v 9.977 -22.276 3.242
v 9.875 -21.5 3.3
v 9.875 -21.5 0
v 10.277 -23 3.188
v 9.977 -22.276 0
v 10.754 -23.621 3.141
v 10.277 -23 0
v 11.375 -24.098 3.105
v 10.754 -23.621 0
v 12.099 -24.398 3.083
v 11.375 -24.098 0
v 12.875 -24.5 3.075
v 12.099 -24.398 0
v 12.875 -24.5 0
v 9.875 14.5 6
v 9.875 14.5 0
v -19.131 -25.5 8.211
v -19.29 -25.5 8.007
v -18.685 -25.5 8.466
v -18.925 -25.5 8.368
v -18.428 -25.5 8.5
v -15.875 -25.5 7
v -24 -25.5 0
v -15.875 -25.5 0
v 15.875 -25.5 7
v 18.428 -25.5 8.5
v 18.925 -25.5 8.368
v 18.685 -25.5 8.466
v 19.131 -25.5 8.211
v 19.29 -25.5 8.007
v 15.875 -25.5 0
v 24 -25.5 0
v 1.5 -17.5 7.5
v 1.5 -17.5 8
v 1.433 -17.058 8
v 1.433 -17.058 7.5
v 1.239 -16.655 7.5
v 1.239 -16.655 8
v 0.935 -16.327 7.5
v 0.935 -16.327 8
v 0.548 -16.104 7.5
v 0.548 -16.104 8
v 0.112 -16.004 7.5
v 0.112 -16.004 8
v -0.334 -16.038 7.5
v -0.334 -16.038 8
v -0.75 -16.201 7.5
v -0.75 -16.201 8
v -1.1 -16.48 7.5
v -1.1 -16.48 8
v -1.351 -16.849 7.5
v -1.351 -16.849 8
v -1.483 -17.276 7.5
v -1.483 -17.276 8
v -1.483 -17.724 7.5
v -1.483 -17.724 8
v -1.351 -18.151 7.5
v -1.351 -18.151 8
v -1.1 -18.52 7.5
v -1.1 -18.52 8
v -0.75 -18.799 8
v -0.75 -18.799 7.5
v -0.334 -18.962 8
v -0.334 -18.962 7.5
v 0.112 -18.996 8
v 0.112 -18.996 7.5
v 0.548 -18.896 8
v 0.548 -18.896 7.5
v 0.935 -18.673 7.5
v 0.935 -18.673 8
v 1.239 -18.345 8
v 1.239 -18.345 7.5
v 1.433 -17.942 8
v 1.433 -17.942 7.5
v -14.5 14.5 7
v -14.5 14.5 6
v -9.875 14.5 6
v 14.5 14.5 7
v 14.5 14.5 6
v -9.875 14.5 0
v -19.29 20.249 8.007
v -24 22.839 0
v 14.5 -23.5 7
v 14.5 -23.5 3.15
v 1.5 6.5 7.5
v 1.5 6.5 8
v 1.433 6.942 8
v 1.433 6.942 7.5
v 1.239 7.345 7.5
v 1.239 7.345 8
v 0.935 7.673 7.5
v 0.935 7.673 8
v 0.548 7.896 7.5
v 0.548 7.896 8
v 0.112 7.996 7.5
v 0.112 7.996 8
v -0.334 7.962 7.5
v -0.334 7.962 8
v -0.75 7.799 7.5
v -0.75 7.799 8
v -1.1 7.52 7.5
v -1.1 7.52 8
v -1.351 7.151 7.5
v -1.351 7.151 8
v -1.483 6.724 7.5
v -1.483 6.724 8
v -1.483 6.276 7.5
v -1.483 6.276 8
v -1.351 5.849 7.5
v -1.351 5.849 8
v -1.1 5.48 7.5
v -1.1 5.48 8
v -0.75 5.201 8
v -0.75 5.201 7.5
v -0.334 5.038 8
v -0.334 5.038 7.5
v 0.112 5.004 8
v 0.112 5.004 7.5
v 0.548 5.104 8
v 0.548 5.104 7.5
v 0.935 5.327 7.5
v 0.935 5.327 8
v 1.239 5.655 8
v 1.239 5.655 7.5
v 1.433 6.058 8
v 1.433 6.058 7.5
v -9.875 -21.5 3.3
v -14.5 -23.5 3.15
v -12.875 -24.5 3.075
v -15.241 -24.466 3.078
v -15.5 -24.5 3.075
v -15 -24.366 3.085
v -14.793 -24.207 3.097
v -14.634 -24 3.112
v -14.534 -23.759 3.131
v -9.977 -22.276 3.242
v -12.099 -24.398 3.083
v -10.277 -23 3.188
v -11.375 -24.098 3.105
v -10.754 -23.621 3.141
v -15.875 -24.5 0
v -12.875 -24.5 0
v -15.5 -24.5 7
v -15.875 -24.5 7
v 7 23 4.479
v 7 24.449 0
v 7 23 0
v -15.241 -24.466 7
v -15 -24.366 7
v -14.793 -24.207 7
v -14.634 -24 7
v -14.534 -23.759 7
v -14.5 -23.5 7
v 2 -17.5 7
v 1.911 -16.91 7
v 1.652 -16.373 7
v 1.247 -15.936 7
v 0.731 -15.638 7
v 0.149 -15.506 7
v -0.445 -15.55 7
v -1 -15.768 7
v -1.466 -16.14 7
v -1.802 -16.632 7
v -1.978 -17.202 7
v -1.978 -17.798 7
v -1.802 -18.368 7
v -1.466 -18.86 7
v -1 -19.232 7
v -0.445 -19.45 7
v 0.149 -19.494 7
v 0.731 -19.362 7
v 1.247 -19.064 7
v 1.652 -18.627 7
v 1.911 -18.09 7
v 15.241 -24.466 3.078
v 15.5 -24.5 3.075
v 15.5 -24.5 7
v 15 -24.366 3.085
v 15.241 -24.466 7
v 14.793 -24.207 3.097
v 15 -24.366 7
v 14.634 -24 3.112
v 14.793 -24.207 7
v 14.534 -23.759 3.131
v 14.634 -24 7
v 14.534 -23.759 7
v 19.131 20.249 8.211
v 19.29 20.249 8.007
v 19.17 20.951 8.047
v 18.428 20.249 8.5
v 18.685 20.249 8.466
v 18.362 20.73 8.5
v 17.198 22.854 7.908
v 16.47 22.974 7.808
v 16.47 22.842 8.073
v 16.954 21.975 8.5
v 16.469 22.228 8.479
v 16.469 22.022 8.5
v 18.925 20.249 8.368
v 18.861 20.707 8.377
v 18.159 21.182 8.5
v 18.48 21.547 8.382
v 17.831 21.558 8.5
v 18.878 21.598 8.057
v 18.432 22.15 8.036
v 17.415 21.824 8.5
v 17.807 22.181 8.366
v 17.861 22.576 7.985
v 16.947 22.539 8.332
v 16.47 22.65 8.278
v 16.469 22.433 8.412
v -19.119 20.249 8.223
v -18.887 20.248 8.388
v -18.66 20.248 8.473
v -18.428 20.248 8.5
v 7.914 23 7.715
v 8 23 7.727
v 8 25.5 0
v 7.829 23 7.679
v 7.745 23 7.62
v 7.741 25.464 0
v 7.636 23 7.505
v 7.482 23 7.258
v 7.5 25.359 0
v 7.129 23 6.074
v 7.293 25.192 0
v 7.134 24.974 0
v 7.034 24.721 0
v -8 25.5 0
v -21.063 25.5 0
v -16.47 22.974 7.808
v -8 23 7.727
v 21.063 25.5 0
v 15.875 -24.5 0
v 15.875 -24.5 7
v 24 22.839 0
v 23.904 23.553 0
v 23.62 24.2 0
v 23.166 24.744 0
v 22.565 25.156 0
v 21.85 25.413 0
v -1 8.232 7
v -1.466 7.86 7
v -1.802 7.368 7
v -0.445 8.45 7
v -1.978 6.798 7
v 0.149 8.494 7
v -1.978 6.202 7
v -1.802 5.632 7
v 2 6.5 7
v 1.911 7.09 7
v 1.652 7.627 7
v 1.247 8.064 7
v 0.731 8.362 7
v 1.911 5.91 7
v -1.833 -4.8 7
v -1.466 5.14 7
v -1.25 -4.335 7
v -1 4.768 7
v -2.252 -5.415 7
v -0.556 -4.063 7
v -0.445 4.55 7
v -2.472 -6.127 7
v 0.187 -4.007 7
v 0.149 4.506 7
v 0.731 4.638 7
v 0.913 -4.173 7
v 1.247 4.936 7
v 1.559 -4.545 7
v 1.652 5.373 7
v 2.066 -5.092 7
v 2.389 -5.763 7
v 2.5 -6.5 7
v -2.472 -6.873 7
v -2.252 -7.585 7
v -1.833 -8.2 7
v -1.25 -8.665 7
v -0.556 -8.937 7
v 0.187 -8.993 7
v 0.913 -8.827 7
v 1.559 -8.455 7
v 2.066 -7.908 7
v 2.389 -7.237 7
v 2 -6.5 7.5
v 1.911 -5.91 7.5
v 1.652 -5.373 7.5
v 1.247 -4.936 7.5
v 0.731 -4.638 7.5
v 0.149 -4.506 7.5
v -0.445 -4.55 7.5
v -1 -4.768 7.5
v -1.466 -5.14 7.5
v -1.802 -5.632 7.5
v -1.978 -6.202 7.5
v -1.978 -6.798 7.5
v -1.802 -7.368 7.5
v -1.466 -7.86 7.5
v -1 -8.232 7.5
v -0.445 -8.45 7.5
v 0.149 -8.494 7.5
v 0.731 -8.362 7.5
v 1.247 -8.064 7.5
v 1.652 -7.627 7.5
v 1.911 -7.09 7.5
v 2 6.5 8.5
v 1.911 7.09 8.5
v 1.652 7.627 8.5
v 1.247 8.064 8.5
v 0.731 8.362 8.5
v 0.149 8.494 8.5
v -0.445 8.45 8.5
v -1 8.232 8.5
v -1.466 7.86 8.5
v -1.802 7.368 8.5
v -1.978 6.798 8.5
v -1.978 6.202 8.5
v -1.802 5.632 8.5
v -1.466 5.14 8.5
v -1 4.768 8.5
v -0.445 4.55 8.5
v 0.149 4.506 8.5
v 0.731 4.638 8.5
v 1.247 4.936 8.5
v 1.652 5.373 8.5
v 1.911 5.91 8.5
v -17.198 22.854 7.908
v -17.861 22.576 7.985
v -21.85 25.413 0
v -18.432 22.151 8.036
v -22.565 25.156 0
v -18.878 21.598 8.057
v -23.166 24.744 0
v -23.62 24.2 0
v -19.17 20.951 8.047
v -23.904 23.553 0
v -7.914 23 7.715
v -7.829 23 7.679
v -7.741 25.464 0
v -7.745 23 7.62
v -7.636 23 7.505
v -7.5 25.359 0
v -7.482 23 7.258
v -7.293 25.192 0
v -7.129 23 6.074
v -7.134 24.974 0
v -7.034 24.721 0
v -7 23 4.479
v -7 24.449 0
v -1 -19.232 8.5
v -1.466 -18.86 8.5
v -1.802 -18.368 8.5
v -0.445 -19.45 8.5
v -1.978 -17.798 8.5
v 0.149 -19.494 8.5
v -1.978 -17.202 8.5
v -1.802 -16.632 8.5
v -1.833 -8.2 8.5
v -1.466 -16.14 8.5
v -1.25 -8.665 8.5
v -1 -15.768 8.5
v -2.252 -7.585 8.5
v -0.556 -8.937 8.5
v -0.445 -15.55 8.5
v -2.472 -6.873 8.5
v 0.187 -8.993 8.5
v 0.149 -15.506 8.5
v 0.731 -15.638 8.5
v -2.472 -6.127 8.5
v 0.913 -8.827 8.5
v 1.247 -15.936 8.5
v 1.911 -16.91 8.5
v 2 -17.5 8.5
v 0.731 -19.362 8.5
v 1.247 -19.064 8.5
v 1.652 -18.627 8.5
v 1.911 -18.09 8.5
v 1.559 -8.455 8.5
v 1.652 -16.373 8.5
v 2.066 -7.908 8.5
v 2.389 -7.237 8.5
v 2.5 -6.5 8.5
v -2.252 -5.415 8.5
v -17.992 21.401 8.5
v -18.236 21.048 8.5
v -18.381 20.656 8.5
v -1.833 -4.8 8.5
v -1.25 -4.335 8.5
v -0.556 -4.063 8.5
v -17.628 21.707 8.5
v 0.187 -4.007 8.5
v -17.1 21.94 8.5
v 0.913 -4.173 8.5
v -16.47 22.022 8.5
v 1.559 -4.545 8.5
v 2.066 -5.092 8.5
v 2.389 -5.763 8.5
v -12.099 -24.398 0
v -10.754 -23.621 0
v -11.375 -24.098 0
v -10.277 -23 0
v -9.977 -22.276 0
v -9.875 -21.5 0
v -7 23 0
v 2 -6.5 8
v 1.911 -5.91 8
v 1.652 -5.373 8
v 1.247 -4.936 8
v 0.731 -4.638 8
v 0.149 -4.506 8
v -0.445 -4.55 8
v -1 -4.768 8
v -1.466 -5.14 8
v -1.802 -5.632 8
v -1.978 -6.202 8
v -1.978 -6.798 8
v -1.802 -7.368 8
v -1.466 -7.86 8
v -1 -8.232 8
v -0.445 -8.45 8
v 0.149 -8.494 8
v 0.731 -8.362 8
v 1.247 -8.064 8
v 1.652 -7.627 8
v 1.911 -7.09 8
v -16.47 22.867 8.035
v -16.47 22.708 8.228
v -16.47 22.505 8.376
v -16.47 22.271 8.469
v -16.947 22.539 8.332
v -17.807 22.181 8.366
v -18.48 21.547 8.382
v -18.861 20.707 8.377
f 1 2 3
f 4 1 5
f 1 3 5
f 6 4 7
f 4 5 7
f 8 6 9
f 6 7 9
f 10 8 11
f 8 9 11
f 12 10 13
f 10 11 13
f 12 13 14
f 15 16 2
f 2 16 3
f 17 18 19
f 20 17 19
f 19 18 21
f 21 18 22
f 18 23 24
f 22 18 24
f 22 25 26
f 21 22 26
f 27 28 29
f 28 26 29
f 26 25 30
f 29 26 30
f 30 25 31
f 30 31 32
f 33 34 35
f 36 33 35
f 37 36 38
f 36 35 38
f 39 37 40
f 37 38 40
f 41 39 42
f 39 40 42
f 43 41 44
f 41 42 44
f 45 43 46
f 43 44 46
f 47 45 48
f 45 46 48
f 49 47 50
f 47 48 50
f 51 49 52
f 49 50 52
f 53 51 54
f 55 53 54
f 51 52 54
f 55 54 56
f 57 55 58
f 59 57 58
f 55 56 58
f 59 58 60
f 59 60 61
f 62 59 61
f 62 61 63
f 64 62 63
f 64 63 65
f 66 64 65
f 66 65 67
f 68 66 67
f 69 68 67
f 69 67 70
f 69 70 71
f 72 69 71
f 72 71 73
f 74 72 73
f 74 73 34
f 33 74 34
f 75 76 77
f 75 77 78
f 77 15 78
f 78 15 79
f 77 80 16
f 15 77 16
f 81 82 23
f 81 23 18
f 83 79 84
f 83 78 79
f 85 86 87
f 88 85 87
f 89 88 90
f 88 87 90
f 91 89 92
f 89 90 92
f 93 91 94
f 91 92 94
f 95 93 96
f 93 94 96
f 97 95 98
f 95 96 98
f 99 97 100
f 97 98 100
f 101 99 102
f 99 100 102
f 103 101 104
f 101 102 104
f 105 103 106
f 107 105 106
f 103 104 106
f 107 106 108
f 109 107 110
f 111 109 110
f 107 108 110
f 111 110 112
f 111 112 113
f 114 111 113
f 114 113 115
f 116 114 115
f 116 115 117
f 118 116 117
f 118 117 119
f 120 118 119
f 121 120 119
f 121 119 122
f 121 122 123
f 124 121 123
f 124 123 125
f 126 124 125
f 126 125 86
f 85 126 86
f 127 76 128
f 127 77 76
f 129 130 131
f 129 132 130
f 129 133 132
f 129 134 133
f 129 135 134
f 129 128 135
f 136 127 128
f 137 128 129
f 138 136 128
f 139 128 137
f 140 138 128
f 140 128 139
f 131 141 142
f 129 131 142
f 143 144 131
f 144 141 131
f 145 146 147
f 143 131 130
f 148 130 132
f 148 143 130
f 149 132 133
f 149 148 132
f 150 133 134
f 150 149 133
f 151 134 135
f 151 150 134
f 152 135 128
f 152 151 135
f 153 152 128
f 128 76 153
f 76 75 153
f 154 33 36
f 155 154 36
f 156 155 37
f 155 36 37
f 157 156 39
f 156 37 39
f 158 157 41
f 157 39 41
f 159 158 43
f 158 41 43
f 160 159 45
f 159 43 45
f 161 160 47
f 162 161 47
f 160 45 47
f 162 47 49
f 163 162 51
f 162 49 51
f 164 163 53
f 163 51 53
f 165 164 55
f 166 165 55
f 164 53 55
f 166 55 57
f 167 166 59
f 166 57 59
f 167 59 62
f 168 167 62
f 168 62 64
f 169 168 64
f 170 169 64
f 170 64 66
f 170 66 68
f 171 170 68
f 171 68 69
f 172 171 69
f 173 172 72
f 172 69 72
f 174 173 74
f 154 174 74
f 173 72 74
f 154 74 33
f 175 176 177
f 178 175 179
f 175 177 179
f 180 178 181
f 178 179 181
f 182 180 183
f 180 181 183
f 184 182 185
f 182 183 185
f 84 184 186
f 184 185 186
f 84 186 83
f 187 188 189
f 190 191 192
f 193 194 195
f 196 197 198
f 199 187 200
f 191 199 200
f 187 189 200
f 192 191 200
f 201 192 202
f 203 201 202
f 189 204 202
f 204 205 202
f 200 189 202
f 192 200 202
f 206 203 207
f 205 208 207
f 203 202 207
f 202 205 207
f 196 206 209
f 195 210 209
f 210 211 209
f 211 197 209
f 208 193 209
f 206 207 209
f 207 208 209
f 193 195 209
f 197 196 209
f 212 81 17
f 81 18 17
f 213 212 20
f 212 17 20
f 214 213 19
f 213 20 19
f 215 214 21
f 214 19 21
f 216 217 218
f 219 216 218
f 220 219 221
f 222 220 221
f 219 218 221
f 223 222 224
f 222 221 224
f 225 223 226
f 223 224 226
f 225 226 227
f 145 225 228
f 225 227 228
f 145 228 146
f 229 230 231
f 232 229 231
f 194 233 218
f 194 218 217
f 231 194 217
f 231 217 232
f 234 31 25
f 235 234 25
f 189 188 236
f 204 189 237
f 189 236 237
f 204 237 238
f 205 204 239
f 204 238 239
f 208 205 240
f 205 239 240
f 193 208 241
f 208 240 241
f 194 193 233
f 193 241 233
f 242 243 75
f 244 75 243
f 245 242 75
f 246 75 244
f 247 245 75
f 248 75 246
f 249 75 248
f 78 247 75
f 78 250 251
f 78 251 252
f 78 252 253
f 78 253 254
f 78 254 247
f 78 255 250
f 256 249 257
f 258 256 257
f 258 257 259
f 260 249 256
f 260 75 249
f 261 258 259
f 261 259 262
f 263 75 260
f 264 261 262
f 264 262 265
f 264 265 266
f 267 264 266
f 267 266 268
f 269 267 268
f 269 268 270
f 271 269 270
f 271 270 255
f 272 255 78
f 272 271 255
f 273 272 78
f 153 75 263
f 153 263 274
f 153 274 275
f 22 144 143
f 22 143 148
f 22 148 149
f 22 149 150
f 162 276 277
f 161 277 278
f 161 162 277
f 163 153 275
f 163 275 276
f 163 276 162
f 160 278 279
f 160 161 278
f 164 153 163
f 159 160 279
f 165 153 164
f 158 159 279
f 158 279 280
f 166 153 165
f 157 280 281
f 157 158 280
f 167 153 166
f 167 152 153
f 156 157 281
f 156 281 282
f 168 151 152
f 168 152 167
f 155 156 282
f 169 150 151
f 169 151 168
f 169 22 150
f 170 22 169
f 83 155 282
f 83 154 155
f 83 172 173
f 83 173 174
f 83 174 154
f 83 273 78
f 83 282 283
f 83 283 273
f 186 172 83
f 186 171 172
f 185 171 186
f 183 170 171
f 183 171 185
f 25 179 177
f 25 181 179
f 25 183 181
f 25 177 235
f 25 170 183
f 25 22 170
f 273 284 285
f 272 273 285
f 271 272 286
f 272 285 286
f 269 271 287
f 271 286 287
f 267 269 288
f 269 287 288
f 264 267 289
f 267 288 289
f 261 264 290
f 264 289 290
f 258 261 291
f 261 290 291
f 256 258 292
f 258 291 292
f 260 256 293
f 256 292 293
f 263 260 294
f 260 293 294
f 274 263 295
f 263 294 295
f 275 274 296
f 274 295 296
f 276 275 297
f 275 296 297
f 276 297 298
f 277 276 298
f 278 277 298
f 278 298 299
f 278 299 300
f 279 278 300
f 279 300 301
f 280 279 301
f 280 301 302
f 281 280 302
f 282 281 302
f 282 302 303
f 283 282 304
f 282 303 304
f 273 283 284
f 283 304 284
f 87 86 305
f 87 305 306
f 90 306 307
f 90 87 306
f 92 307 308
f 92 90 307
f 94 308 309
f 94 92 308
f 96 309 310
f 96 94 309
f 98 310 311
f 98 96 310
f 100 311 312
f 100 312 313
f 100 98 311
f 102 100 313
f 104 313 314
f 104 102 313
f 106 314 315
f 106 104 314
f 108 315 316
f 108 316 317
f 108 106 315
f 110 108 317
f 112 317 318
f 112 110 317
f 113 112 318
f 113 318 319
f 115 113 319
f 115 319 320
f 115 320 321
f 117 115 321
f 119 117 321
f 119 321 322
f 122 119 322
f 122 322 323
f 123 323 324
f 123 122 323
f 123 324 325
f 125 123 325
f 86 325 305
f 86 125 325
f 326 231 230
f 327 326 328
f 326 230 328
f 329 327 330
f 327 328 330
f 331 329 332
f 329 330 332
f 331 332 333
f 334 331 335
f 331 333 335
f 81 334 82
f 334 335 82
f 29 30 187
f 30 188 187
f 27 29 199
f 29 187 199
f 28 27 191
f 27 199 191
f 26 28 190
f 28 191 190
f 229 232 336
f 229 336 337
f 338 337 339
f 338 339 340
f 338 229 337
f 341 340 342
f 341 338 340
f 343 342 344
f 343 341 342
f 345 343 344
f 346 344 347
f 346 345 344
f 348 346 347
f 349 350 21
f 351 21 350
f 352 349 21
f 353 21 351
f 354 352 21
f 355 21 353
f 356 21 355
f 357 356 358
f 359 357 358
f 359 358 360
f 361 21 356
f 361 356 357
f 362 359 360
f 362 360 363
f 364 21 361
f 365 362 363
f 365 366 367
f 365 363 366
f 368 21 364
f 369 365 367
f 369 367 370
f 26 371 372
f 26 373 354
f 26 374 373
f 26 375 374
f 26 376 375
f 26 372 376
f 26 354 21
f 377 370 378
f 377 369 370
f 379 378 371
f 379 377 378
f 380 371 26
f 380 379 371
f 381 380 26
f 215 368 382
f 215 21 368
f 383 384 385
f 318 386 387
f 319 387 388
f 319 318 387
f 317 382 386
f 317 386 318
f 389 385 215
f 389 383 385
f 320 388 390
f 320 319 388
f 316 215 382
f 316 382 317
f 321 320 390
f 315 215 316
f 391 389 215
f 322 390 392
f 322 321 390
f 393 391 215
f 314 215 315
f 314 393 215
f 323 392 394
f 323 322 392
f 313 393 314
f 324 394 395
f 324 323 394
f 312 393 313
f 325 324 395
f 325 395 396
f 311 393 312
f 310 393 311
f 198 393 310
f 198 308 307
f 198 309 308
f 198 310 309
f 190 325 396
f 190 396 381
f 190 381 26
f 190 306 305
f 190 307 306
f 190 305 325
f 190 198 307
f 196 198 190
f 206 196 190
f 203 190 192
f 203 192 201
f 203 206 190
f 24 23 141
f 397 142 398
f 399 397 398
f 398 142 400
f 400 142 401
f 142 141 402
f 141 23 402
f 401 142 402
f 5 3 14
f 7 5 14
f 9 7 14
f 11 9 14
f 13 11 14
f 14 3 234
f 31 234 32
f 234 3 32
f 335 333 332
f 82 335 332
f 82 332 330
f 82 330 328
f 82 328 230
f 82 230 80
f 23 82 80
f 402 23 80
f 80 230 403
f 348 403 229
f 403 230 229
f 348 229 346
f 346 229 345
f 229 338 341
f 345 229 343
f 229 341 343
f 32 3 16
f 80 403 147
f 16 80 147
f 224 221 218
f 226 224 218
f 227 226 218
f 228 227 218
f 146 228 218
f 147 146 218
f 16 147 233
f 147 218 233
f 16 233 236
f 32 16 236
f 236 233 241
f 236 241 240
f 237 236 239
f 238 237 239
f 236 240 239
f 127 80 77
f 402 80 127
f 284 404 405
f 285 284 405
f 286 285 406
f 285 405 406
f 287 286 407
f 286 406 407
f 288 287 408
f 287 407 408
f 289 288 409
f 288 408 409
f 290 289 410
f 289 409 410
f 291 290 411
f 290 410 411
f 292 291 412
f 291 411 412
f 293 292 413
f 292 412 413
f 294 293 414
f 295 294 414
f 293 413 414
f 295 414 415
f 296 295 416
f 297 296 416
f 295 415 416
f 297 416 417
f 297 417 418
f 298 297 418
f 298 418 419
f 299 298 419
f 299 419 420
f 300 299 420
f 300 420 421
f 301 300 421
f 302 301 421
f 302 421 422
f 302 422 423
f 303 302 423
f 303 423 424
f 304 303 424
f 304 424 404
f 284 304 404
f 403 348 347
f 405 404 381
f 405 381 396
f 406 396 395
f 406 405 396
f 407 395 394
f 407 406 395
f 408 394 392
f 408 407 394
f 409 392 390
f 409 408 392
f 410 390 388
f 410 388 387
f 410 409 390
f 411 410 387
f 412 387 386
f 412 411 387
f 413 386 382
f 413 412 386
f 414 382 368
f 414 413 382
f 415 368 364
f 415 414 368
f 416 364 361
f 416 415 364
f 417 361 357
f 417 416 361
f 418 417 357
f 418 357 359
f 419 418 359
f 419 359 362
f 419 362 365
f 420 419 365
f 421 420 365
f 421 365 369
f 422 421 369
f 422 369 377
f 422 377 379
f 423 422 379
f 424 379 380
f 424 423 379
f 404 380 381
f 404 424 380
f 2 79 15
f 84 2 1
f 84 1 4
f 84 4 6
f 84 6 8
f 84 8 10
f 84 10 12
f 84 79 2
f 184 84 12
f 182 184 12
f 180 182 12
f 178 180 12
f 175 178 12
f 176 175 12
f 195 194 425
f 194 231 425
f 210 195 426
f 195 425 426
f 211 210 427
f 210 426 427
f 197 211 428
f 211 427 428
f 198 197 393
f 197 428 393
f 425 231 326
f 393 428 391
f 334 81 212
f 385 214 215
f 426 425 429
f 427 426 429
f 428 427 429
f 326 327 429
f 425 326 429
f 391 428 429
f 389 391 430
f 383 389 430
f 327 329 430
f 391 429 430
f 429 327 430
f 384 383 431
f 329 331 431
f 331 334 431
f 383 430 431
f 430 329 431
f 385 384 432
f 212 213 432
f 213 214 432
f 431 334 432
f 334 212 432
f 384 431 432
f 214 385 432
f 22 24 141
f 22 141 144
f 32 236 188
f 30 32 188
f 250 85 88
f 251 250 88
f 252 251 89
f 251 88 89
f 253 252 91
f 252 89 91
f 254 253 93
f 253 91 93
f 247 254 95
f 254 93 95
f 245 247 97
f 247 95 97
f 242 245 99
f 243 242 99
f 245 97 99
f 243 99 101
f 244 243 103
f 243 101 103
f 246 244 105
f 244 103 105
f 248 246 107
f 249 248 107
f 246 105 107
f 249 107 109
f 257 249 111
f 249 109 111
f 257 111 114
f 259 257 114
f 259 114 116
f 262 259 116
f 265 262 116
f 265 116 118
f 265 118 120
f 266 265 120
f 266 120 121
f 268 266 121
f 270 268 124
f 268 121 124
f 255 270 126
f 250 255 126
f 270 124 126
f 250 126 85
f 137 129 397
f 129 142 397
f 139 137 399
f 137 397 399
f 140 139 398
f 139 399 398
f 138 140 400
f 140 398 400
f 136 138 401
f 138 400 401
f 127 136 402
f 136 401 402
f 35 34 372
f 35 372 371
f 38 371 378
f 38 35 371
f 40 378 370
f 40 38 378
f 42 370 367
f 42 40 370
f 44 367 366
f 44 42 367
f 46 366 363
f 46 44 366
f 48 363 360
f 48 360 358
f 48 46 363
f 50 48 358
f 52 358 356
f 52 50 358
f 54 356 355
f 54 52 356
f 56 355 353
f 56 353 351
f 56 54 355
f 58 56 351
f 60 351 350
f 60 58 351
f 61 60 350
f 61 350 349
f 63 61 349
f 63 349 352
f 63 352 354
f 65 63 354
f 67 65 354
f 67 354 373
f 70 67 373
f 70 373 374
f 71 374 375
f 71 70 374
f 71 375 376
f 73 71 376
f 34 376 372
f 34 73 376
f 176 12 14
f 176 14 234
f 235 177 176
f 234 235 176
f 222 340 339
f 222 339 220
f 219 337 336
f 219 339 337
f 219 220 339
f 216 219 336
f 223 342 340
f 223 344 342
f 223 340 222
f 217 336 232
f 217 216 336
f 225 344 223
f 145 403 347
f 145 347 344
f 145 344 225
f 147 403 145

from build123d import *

# Parameters (mm, degrees)
SKETCH_W        = 48
SKETCH_H        = 51
PAD_DEPTH       = 8.5
POCKET_DEPTH    = 48.001
POCKET001_DEPTH = 51.001
SKETCH002_W     = 19.75
SKETCH002_H     = 40
POCKET002_DEPTH = 7
POCKET003_DEPTH = 14.5
SKETCH005_W     = 14
SKETCH005_H     = 2.5
POCKET005_DEPTH = 8.501
SKETCH007_W     = 31.75
SKETCH007_H     = 7
POCKET006_DEPTH = 1
FILLET_R        = 3
FILLET001_R     = 1
SKETCH004_R     = 1.5
SKETCH004_R_2   = 2
POCKET007_DEPTH = 5
CHAMFER_SIZE    = 0.5


with BuildPart() as part:
    # Sketch → Pad (new body)
    with BuildSketch(Plane.XY):
        Rectangle(SKETCH_W, SKETCH_H)
    extrude(amount=PAD_DEPTH)

    # Sketch006 (on Face2 of Pad) → Pocket (cut, through all)
    with BuildSketch(Plane.YZ.offset(24)):
        Polygon((25.5, 8.5), (25.5, 0), (22.75, 8.5), align=None)
    extrude(amount=-POCKET_DEPTH, mode=Mode.SUBTRACT)

    # Sketch001 (on Face3 of Pad) → Pocket001 (cut, through all)
    with BuildSketch(Plane.XZ.offset(25.5)):
        Polygon((-24, 8.5), (-24, 0), (-19, 8.5), align=None)
        Polygon((24, 8.5), (24, 0), (19, 8.5), align=None)
    extrude(amount=-POCKET001_DEPTH, mode=Mode.SUBTRACT)

    # Sketch002 → Pocket002 (cut)
    with BuildSketch(Plane(origin=(0, 0, 0), x_dir=(1, 0, 0), z_dir=(0, 0, -1))):
        with Locations((0, 5.5)):
            Rectangle(SKETCH002_W, SKETCH002_H)
    extrude(amount=-POCKET002_DEPTH, mode=Mode.SUBTRACT)

    # Sketch003 → Pocket003 (cut, symmetric)
    with BuildSketch(Plane.YZ):
        Polygon((-25.5, 3), (-25.5, 7), (14.5, 7), (14.5, 6), align=None)
    extrude(amount=POCKET003_DEPTH, both=True, mode=Mode.SUBTRACT)

    # Sketch005 → Pocket005 (cut, through all)
    with BuildSketch(Plane(origin=(0, 0, 0), x_dir=(1, 0, 0), z_dir=(0, 0, -1))):
        with Locations((0, -24.25)):
            Rectangle(SKETCH005_W, SKETCH005_H)
    extrude(amount=-POCKET005_DEPTH, mode=Mode.SUBTRACT)

    # Sketch007 (on Face2 of Pocket005) → Pocket006 (cut)
    with BuildSketch(Plane.XZ.offset(25.5)):
        with Locations((0, 3.5)):
            Rectangle(SKETCH007_W, SKETCH007_H)
    extrude(amount=-POCKET006_DEPTH, mode=Mode.SUBTRACT)

    # Fillet
    fillet_edges = [part.edges().sort_by_distance(p)[0] for p in [
        (21.5, 24.125, 4.25),
        (-21.5, 24.125, 4.25),
        (-9.875, -24.5, 1.5375),
        (9.875, -24.5, 1.5375),
    ]]
    fillet(fillet_edges, radius=FILLET_R)

    # Fillet001
    fillet001_edges = [part.edges().sort_by_distance(p)[0] for p in [
        (19, -2.705496, 8.5),
        (7, 24.25, 3.863636),
        (-7, 24.25, 3.863636),
        (-14.5, -24.5, 5.0375),
        (14.5, -24.5, 5.0375),
    ]]
    fillet(fillet001_edges, radius=FILLET001_R)

    # Sketch004 (on Face25 of Fillet001) → Pocket007 (cut)
    with BuildSketch(Plane.XY.offset(8.5)):
        with Locations((0, 6.5)):
            Circle(SKETCH004_R)
        with Locations((0, -6.5)):
            Circle(SKETCH004_R_2)
        with Locations((0, -17.5)):
            Circle(SKETCH004_R)
    extrude(amount=-POCKET007_DEPTH, mode=Mode.SUBTRACT)

    # Chamfer
    chamfer_edges = [part.edges().sort_by_distance(p)[0] for p in [
        (-2, -6.5, 8.5),
        (-1.5, -17.5, 8.5),
        (-1.5, 6.5, 8.5),
        (-1.5, -17.5, 7),
        (-2, -6.5, 7),
        (-1.5, 6.5, 7),
    ]]
    chamfer(chamfer_edges, length=CHAMFER_SIZE)


solid = part.part
